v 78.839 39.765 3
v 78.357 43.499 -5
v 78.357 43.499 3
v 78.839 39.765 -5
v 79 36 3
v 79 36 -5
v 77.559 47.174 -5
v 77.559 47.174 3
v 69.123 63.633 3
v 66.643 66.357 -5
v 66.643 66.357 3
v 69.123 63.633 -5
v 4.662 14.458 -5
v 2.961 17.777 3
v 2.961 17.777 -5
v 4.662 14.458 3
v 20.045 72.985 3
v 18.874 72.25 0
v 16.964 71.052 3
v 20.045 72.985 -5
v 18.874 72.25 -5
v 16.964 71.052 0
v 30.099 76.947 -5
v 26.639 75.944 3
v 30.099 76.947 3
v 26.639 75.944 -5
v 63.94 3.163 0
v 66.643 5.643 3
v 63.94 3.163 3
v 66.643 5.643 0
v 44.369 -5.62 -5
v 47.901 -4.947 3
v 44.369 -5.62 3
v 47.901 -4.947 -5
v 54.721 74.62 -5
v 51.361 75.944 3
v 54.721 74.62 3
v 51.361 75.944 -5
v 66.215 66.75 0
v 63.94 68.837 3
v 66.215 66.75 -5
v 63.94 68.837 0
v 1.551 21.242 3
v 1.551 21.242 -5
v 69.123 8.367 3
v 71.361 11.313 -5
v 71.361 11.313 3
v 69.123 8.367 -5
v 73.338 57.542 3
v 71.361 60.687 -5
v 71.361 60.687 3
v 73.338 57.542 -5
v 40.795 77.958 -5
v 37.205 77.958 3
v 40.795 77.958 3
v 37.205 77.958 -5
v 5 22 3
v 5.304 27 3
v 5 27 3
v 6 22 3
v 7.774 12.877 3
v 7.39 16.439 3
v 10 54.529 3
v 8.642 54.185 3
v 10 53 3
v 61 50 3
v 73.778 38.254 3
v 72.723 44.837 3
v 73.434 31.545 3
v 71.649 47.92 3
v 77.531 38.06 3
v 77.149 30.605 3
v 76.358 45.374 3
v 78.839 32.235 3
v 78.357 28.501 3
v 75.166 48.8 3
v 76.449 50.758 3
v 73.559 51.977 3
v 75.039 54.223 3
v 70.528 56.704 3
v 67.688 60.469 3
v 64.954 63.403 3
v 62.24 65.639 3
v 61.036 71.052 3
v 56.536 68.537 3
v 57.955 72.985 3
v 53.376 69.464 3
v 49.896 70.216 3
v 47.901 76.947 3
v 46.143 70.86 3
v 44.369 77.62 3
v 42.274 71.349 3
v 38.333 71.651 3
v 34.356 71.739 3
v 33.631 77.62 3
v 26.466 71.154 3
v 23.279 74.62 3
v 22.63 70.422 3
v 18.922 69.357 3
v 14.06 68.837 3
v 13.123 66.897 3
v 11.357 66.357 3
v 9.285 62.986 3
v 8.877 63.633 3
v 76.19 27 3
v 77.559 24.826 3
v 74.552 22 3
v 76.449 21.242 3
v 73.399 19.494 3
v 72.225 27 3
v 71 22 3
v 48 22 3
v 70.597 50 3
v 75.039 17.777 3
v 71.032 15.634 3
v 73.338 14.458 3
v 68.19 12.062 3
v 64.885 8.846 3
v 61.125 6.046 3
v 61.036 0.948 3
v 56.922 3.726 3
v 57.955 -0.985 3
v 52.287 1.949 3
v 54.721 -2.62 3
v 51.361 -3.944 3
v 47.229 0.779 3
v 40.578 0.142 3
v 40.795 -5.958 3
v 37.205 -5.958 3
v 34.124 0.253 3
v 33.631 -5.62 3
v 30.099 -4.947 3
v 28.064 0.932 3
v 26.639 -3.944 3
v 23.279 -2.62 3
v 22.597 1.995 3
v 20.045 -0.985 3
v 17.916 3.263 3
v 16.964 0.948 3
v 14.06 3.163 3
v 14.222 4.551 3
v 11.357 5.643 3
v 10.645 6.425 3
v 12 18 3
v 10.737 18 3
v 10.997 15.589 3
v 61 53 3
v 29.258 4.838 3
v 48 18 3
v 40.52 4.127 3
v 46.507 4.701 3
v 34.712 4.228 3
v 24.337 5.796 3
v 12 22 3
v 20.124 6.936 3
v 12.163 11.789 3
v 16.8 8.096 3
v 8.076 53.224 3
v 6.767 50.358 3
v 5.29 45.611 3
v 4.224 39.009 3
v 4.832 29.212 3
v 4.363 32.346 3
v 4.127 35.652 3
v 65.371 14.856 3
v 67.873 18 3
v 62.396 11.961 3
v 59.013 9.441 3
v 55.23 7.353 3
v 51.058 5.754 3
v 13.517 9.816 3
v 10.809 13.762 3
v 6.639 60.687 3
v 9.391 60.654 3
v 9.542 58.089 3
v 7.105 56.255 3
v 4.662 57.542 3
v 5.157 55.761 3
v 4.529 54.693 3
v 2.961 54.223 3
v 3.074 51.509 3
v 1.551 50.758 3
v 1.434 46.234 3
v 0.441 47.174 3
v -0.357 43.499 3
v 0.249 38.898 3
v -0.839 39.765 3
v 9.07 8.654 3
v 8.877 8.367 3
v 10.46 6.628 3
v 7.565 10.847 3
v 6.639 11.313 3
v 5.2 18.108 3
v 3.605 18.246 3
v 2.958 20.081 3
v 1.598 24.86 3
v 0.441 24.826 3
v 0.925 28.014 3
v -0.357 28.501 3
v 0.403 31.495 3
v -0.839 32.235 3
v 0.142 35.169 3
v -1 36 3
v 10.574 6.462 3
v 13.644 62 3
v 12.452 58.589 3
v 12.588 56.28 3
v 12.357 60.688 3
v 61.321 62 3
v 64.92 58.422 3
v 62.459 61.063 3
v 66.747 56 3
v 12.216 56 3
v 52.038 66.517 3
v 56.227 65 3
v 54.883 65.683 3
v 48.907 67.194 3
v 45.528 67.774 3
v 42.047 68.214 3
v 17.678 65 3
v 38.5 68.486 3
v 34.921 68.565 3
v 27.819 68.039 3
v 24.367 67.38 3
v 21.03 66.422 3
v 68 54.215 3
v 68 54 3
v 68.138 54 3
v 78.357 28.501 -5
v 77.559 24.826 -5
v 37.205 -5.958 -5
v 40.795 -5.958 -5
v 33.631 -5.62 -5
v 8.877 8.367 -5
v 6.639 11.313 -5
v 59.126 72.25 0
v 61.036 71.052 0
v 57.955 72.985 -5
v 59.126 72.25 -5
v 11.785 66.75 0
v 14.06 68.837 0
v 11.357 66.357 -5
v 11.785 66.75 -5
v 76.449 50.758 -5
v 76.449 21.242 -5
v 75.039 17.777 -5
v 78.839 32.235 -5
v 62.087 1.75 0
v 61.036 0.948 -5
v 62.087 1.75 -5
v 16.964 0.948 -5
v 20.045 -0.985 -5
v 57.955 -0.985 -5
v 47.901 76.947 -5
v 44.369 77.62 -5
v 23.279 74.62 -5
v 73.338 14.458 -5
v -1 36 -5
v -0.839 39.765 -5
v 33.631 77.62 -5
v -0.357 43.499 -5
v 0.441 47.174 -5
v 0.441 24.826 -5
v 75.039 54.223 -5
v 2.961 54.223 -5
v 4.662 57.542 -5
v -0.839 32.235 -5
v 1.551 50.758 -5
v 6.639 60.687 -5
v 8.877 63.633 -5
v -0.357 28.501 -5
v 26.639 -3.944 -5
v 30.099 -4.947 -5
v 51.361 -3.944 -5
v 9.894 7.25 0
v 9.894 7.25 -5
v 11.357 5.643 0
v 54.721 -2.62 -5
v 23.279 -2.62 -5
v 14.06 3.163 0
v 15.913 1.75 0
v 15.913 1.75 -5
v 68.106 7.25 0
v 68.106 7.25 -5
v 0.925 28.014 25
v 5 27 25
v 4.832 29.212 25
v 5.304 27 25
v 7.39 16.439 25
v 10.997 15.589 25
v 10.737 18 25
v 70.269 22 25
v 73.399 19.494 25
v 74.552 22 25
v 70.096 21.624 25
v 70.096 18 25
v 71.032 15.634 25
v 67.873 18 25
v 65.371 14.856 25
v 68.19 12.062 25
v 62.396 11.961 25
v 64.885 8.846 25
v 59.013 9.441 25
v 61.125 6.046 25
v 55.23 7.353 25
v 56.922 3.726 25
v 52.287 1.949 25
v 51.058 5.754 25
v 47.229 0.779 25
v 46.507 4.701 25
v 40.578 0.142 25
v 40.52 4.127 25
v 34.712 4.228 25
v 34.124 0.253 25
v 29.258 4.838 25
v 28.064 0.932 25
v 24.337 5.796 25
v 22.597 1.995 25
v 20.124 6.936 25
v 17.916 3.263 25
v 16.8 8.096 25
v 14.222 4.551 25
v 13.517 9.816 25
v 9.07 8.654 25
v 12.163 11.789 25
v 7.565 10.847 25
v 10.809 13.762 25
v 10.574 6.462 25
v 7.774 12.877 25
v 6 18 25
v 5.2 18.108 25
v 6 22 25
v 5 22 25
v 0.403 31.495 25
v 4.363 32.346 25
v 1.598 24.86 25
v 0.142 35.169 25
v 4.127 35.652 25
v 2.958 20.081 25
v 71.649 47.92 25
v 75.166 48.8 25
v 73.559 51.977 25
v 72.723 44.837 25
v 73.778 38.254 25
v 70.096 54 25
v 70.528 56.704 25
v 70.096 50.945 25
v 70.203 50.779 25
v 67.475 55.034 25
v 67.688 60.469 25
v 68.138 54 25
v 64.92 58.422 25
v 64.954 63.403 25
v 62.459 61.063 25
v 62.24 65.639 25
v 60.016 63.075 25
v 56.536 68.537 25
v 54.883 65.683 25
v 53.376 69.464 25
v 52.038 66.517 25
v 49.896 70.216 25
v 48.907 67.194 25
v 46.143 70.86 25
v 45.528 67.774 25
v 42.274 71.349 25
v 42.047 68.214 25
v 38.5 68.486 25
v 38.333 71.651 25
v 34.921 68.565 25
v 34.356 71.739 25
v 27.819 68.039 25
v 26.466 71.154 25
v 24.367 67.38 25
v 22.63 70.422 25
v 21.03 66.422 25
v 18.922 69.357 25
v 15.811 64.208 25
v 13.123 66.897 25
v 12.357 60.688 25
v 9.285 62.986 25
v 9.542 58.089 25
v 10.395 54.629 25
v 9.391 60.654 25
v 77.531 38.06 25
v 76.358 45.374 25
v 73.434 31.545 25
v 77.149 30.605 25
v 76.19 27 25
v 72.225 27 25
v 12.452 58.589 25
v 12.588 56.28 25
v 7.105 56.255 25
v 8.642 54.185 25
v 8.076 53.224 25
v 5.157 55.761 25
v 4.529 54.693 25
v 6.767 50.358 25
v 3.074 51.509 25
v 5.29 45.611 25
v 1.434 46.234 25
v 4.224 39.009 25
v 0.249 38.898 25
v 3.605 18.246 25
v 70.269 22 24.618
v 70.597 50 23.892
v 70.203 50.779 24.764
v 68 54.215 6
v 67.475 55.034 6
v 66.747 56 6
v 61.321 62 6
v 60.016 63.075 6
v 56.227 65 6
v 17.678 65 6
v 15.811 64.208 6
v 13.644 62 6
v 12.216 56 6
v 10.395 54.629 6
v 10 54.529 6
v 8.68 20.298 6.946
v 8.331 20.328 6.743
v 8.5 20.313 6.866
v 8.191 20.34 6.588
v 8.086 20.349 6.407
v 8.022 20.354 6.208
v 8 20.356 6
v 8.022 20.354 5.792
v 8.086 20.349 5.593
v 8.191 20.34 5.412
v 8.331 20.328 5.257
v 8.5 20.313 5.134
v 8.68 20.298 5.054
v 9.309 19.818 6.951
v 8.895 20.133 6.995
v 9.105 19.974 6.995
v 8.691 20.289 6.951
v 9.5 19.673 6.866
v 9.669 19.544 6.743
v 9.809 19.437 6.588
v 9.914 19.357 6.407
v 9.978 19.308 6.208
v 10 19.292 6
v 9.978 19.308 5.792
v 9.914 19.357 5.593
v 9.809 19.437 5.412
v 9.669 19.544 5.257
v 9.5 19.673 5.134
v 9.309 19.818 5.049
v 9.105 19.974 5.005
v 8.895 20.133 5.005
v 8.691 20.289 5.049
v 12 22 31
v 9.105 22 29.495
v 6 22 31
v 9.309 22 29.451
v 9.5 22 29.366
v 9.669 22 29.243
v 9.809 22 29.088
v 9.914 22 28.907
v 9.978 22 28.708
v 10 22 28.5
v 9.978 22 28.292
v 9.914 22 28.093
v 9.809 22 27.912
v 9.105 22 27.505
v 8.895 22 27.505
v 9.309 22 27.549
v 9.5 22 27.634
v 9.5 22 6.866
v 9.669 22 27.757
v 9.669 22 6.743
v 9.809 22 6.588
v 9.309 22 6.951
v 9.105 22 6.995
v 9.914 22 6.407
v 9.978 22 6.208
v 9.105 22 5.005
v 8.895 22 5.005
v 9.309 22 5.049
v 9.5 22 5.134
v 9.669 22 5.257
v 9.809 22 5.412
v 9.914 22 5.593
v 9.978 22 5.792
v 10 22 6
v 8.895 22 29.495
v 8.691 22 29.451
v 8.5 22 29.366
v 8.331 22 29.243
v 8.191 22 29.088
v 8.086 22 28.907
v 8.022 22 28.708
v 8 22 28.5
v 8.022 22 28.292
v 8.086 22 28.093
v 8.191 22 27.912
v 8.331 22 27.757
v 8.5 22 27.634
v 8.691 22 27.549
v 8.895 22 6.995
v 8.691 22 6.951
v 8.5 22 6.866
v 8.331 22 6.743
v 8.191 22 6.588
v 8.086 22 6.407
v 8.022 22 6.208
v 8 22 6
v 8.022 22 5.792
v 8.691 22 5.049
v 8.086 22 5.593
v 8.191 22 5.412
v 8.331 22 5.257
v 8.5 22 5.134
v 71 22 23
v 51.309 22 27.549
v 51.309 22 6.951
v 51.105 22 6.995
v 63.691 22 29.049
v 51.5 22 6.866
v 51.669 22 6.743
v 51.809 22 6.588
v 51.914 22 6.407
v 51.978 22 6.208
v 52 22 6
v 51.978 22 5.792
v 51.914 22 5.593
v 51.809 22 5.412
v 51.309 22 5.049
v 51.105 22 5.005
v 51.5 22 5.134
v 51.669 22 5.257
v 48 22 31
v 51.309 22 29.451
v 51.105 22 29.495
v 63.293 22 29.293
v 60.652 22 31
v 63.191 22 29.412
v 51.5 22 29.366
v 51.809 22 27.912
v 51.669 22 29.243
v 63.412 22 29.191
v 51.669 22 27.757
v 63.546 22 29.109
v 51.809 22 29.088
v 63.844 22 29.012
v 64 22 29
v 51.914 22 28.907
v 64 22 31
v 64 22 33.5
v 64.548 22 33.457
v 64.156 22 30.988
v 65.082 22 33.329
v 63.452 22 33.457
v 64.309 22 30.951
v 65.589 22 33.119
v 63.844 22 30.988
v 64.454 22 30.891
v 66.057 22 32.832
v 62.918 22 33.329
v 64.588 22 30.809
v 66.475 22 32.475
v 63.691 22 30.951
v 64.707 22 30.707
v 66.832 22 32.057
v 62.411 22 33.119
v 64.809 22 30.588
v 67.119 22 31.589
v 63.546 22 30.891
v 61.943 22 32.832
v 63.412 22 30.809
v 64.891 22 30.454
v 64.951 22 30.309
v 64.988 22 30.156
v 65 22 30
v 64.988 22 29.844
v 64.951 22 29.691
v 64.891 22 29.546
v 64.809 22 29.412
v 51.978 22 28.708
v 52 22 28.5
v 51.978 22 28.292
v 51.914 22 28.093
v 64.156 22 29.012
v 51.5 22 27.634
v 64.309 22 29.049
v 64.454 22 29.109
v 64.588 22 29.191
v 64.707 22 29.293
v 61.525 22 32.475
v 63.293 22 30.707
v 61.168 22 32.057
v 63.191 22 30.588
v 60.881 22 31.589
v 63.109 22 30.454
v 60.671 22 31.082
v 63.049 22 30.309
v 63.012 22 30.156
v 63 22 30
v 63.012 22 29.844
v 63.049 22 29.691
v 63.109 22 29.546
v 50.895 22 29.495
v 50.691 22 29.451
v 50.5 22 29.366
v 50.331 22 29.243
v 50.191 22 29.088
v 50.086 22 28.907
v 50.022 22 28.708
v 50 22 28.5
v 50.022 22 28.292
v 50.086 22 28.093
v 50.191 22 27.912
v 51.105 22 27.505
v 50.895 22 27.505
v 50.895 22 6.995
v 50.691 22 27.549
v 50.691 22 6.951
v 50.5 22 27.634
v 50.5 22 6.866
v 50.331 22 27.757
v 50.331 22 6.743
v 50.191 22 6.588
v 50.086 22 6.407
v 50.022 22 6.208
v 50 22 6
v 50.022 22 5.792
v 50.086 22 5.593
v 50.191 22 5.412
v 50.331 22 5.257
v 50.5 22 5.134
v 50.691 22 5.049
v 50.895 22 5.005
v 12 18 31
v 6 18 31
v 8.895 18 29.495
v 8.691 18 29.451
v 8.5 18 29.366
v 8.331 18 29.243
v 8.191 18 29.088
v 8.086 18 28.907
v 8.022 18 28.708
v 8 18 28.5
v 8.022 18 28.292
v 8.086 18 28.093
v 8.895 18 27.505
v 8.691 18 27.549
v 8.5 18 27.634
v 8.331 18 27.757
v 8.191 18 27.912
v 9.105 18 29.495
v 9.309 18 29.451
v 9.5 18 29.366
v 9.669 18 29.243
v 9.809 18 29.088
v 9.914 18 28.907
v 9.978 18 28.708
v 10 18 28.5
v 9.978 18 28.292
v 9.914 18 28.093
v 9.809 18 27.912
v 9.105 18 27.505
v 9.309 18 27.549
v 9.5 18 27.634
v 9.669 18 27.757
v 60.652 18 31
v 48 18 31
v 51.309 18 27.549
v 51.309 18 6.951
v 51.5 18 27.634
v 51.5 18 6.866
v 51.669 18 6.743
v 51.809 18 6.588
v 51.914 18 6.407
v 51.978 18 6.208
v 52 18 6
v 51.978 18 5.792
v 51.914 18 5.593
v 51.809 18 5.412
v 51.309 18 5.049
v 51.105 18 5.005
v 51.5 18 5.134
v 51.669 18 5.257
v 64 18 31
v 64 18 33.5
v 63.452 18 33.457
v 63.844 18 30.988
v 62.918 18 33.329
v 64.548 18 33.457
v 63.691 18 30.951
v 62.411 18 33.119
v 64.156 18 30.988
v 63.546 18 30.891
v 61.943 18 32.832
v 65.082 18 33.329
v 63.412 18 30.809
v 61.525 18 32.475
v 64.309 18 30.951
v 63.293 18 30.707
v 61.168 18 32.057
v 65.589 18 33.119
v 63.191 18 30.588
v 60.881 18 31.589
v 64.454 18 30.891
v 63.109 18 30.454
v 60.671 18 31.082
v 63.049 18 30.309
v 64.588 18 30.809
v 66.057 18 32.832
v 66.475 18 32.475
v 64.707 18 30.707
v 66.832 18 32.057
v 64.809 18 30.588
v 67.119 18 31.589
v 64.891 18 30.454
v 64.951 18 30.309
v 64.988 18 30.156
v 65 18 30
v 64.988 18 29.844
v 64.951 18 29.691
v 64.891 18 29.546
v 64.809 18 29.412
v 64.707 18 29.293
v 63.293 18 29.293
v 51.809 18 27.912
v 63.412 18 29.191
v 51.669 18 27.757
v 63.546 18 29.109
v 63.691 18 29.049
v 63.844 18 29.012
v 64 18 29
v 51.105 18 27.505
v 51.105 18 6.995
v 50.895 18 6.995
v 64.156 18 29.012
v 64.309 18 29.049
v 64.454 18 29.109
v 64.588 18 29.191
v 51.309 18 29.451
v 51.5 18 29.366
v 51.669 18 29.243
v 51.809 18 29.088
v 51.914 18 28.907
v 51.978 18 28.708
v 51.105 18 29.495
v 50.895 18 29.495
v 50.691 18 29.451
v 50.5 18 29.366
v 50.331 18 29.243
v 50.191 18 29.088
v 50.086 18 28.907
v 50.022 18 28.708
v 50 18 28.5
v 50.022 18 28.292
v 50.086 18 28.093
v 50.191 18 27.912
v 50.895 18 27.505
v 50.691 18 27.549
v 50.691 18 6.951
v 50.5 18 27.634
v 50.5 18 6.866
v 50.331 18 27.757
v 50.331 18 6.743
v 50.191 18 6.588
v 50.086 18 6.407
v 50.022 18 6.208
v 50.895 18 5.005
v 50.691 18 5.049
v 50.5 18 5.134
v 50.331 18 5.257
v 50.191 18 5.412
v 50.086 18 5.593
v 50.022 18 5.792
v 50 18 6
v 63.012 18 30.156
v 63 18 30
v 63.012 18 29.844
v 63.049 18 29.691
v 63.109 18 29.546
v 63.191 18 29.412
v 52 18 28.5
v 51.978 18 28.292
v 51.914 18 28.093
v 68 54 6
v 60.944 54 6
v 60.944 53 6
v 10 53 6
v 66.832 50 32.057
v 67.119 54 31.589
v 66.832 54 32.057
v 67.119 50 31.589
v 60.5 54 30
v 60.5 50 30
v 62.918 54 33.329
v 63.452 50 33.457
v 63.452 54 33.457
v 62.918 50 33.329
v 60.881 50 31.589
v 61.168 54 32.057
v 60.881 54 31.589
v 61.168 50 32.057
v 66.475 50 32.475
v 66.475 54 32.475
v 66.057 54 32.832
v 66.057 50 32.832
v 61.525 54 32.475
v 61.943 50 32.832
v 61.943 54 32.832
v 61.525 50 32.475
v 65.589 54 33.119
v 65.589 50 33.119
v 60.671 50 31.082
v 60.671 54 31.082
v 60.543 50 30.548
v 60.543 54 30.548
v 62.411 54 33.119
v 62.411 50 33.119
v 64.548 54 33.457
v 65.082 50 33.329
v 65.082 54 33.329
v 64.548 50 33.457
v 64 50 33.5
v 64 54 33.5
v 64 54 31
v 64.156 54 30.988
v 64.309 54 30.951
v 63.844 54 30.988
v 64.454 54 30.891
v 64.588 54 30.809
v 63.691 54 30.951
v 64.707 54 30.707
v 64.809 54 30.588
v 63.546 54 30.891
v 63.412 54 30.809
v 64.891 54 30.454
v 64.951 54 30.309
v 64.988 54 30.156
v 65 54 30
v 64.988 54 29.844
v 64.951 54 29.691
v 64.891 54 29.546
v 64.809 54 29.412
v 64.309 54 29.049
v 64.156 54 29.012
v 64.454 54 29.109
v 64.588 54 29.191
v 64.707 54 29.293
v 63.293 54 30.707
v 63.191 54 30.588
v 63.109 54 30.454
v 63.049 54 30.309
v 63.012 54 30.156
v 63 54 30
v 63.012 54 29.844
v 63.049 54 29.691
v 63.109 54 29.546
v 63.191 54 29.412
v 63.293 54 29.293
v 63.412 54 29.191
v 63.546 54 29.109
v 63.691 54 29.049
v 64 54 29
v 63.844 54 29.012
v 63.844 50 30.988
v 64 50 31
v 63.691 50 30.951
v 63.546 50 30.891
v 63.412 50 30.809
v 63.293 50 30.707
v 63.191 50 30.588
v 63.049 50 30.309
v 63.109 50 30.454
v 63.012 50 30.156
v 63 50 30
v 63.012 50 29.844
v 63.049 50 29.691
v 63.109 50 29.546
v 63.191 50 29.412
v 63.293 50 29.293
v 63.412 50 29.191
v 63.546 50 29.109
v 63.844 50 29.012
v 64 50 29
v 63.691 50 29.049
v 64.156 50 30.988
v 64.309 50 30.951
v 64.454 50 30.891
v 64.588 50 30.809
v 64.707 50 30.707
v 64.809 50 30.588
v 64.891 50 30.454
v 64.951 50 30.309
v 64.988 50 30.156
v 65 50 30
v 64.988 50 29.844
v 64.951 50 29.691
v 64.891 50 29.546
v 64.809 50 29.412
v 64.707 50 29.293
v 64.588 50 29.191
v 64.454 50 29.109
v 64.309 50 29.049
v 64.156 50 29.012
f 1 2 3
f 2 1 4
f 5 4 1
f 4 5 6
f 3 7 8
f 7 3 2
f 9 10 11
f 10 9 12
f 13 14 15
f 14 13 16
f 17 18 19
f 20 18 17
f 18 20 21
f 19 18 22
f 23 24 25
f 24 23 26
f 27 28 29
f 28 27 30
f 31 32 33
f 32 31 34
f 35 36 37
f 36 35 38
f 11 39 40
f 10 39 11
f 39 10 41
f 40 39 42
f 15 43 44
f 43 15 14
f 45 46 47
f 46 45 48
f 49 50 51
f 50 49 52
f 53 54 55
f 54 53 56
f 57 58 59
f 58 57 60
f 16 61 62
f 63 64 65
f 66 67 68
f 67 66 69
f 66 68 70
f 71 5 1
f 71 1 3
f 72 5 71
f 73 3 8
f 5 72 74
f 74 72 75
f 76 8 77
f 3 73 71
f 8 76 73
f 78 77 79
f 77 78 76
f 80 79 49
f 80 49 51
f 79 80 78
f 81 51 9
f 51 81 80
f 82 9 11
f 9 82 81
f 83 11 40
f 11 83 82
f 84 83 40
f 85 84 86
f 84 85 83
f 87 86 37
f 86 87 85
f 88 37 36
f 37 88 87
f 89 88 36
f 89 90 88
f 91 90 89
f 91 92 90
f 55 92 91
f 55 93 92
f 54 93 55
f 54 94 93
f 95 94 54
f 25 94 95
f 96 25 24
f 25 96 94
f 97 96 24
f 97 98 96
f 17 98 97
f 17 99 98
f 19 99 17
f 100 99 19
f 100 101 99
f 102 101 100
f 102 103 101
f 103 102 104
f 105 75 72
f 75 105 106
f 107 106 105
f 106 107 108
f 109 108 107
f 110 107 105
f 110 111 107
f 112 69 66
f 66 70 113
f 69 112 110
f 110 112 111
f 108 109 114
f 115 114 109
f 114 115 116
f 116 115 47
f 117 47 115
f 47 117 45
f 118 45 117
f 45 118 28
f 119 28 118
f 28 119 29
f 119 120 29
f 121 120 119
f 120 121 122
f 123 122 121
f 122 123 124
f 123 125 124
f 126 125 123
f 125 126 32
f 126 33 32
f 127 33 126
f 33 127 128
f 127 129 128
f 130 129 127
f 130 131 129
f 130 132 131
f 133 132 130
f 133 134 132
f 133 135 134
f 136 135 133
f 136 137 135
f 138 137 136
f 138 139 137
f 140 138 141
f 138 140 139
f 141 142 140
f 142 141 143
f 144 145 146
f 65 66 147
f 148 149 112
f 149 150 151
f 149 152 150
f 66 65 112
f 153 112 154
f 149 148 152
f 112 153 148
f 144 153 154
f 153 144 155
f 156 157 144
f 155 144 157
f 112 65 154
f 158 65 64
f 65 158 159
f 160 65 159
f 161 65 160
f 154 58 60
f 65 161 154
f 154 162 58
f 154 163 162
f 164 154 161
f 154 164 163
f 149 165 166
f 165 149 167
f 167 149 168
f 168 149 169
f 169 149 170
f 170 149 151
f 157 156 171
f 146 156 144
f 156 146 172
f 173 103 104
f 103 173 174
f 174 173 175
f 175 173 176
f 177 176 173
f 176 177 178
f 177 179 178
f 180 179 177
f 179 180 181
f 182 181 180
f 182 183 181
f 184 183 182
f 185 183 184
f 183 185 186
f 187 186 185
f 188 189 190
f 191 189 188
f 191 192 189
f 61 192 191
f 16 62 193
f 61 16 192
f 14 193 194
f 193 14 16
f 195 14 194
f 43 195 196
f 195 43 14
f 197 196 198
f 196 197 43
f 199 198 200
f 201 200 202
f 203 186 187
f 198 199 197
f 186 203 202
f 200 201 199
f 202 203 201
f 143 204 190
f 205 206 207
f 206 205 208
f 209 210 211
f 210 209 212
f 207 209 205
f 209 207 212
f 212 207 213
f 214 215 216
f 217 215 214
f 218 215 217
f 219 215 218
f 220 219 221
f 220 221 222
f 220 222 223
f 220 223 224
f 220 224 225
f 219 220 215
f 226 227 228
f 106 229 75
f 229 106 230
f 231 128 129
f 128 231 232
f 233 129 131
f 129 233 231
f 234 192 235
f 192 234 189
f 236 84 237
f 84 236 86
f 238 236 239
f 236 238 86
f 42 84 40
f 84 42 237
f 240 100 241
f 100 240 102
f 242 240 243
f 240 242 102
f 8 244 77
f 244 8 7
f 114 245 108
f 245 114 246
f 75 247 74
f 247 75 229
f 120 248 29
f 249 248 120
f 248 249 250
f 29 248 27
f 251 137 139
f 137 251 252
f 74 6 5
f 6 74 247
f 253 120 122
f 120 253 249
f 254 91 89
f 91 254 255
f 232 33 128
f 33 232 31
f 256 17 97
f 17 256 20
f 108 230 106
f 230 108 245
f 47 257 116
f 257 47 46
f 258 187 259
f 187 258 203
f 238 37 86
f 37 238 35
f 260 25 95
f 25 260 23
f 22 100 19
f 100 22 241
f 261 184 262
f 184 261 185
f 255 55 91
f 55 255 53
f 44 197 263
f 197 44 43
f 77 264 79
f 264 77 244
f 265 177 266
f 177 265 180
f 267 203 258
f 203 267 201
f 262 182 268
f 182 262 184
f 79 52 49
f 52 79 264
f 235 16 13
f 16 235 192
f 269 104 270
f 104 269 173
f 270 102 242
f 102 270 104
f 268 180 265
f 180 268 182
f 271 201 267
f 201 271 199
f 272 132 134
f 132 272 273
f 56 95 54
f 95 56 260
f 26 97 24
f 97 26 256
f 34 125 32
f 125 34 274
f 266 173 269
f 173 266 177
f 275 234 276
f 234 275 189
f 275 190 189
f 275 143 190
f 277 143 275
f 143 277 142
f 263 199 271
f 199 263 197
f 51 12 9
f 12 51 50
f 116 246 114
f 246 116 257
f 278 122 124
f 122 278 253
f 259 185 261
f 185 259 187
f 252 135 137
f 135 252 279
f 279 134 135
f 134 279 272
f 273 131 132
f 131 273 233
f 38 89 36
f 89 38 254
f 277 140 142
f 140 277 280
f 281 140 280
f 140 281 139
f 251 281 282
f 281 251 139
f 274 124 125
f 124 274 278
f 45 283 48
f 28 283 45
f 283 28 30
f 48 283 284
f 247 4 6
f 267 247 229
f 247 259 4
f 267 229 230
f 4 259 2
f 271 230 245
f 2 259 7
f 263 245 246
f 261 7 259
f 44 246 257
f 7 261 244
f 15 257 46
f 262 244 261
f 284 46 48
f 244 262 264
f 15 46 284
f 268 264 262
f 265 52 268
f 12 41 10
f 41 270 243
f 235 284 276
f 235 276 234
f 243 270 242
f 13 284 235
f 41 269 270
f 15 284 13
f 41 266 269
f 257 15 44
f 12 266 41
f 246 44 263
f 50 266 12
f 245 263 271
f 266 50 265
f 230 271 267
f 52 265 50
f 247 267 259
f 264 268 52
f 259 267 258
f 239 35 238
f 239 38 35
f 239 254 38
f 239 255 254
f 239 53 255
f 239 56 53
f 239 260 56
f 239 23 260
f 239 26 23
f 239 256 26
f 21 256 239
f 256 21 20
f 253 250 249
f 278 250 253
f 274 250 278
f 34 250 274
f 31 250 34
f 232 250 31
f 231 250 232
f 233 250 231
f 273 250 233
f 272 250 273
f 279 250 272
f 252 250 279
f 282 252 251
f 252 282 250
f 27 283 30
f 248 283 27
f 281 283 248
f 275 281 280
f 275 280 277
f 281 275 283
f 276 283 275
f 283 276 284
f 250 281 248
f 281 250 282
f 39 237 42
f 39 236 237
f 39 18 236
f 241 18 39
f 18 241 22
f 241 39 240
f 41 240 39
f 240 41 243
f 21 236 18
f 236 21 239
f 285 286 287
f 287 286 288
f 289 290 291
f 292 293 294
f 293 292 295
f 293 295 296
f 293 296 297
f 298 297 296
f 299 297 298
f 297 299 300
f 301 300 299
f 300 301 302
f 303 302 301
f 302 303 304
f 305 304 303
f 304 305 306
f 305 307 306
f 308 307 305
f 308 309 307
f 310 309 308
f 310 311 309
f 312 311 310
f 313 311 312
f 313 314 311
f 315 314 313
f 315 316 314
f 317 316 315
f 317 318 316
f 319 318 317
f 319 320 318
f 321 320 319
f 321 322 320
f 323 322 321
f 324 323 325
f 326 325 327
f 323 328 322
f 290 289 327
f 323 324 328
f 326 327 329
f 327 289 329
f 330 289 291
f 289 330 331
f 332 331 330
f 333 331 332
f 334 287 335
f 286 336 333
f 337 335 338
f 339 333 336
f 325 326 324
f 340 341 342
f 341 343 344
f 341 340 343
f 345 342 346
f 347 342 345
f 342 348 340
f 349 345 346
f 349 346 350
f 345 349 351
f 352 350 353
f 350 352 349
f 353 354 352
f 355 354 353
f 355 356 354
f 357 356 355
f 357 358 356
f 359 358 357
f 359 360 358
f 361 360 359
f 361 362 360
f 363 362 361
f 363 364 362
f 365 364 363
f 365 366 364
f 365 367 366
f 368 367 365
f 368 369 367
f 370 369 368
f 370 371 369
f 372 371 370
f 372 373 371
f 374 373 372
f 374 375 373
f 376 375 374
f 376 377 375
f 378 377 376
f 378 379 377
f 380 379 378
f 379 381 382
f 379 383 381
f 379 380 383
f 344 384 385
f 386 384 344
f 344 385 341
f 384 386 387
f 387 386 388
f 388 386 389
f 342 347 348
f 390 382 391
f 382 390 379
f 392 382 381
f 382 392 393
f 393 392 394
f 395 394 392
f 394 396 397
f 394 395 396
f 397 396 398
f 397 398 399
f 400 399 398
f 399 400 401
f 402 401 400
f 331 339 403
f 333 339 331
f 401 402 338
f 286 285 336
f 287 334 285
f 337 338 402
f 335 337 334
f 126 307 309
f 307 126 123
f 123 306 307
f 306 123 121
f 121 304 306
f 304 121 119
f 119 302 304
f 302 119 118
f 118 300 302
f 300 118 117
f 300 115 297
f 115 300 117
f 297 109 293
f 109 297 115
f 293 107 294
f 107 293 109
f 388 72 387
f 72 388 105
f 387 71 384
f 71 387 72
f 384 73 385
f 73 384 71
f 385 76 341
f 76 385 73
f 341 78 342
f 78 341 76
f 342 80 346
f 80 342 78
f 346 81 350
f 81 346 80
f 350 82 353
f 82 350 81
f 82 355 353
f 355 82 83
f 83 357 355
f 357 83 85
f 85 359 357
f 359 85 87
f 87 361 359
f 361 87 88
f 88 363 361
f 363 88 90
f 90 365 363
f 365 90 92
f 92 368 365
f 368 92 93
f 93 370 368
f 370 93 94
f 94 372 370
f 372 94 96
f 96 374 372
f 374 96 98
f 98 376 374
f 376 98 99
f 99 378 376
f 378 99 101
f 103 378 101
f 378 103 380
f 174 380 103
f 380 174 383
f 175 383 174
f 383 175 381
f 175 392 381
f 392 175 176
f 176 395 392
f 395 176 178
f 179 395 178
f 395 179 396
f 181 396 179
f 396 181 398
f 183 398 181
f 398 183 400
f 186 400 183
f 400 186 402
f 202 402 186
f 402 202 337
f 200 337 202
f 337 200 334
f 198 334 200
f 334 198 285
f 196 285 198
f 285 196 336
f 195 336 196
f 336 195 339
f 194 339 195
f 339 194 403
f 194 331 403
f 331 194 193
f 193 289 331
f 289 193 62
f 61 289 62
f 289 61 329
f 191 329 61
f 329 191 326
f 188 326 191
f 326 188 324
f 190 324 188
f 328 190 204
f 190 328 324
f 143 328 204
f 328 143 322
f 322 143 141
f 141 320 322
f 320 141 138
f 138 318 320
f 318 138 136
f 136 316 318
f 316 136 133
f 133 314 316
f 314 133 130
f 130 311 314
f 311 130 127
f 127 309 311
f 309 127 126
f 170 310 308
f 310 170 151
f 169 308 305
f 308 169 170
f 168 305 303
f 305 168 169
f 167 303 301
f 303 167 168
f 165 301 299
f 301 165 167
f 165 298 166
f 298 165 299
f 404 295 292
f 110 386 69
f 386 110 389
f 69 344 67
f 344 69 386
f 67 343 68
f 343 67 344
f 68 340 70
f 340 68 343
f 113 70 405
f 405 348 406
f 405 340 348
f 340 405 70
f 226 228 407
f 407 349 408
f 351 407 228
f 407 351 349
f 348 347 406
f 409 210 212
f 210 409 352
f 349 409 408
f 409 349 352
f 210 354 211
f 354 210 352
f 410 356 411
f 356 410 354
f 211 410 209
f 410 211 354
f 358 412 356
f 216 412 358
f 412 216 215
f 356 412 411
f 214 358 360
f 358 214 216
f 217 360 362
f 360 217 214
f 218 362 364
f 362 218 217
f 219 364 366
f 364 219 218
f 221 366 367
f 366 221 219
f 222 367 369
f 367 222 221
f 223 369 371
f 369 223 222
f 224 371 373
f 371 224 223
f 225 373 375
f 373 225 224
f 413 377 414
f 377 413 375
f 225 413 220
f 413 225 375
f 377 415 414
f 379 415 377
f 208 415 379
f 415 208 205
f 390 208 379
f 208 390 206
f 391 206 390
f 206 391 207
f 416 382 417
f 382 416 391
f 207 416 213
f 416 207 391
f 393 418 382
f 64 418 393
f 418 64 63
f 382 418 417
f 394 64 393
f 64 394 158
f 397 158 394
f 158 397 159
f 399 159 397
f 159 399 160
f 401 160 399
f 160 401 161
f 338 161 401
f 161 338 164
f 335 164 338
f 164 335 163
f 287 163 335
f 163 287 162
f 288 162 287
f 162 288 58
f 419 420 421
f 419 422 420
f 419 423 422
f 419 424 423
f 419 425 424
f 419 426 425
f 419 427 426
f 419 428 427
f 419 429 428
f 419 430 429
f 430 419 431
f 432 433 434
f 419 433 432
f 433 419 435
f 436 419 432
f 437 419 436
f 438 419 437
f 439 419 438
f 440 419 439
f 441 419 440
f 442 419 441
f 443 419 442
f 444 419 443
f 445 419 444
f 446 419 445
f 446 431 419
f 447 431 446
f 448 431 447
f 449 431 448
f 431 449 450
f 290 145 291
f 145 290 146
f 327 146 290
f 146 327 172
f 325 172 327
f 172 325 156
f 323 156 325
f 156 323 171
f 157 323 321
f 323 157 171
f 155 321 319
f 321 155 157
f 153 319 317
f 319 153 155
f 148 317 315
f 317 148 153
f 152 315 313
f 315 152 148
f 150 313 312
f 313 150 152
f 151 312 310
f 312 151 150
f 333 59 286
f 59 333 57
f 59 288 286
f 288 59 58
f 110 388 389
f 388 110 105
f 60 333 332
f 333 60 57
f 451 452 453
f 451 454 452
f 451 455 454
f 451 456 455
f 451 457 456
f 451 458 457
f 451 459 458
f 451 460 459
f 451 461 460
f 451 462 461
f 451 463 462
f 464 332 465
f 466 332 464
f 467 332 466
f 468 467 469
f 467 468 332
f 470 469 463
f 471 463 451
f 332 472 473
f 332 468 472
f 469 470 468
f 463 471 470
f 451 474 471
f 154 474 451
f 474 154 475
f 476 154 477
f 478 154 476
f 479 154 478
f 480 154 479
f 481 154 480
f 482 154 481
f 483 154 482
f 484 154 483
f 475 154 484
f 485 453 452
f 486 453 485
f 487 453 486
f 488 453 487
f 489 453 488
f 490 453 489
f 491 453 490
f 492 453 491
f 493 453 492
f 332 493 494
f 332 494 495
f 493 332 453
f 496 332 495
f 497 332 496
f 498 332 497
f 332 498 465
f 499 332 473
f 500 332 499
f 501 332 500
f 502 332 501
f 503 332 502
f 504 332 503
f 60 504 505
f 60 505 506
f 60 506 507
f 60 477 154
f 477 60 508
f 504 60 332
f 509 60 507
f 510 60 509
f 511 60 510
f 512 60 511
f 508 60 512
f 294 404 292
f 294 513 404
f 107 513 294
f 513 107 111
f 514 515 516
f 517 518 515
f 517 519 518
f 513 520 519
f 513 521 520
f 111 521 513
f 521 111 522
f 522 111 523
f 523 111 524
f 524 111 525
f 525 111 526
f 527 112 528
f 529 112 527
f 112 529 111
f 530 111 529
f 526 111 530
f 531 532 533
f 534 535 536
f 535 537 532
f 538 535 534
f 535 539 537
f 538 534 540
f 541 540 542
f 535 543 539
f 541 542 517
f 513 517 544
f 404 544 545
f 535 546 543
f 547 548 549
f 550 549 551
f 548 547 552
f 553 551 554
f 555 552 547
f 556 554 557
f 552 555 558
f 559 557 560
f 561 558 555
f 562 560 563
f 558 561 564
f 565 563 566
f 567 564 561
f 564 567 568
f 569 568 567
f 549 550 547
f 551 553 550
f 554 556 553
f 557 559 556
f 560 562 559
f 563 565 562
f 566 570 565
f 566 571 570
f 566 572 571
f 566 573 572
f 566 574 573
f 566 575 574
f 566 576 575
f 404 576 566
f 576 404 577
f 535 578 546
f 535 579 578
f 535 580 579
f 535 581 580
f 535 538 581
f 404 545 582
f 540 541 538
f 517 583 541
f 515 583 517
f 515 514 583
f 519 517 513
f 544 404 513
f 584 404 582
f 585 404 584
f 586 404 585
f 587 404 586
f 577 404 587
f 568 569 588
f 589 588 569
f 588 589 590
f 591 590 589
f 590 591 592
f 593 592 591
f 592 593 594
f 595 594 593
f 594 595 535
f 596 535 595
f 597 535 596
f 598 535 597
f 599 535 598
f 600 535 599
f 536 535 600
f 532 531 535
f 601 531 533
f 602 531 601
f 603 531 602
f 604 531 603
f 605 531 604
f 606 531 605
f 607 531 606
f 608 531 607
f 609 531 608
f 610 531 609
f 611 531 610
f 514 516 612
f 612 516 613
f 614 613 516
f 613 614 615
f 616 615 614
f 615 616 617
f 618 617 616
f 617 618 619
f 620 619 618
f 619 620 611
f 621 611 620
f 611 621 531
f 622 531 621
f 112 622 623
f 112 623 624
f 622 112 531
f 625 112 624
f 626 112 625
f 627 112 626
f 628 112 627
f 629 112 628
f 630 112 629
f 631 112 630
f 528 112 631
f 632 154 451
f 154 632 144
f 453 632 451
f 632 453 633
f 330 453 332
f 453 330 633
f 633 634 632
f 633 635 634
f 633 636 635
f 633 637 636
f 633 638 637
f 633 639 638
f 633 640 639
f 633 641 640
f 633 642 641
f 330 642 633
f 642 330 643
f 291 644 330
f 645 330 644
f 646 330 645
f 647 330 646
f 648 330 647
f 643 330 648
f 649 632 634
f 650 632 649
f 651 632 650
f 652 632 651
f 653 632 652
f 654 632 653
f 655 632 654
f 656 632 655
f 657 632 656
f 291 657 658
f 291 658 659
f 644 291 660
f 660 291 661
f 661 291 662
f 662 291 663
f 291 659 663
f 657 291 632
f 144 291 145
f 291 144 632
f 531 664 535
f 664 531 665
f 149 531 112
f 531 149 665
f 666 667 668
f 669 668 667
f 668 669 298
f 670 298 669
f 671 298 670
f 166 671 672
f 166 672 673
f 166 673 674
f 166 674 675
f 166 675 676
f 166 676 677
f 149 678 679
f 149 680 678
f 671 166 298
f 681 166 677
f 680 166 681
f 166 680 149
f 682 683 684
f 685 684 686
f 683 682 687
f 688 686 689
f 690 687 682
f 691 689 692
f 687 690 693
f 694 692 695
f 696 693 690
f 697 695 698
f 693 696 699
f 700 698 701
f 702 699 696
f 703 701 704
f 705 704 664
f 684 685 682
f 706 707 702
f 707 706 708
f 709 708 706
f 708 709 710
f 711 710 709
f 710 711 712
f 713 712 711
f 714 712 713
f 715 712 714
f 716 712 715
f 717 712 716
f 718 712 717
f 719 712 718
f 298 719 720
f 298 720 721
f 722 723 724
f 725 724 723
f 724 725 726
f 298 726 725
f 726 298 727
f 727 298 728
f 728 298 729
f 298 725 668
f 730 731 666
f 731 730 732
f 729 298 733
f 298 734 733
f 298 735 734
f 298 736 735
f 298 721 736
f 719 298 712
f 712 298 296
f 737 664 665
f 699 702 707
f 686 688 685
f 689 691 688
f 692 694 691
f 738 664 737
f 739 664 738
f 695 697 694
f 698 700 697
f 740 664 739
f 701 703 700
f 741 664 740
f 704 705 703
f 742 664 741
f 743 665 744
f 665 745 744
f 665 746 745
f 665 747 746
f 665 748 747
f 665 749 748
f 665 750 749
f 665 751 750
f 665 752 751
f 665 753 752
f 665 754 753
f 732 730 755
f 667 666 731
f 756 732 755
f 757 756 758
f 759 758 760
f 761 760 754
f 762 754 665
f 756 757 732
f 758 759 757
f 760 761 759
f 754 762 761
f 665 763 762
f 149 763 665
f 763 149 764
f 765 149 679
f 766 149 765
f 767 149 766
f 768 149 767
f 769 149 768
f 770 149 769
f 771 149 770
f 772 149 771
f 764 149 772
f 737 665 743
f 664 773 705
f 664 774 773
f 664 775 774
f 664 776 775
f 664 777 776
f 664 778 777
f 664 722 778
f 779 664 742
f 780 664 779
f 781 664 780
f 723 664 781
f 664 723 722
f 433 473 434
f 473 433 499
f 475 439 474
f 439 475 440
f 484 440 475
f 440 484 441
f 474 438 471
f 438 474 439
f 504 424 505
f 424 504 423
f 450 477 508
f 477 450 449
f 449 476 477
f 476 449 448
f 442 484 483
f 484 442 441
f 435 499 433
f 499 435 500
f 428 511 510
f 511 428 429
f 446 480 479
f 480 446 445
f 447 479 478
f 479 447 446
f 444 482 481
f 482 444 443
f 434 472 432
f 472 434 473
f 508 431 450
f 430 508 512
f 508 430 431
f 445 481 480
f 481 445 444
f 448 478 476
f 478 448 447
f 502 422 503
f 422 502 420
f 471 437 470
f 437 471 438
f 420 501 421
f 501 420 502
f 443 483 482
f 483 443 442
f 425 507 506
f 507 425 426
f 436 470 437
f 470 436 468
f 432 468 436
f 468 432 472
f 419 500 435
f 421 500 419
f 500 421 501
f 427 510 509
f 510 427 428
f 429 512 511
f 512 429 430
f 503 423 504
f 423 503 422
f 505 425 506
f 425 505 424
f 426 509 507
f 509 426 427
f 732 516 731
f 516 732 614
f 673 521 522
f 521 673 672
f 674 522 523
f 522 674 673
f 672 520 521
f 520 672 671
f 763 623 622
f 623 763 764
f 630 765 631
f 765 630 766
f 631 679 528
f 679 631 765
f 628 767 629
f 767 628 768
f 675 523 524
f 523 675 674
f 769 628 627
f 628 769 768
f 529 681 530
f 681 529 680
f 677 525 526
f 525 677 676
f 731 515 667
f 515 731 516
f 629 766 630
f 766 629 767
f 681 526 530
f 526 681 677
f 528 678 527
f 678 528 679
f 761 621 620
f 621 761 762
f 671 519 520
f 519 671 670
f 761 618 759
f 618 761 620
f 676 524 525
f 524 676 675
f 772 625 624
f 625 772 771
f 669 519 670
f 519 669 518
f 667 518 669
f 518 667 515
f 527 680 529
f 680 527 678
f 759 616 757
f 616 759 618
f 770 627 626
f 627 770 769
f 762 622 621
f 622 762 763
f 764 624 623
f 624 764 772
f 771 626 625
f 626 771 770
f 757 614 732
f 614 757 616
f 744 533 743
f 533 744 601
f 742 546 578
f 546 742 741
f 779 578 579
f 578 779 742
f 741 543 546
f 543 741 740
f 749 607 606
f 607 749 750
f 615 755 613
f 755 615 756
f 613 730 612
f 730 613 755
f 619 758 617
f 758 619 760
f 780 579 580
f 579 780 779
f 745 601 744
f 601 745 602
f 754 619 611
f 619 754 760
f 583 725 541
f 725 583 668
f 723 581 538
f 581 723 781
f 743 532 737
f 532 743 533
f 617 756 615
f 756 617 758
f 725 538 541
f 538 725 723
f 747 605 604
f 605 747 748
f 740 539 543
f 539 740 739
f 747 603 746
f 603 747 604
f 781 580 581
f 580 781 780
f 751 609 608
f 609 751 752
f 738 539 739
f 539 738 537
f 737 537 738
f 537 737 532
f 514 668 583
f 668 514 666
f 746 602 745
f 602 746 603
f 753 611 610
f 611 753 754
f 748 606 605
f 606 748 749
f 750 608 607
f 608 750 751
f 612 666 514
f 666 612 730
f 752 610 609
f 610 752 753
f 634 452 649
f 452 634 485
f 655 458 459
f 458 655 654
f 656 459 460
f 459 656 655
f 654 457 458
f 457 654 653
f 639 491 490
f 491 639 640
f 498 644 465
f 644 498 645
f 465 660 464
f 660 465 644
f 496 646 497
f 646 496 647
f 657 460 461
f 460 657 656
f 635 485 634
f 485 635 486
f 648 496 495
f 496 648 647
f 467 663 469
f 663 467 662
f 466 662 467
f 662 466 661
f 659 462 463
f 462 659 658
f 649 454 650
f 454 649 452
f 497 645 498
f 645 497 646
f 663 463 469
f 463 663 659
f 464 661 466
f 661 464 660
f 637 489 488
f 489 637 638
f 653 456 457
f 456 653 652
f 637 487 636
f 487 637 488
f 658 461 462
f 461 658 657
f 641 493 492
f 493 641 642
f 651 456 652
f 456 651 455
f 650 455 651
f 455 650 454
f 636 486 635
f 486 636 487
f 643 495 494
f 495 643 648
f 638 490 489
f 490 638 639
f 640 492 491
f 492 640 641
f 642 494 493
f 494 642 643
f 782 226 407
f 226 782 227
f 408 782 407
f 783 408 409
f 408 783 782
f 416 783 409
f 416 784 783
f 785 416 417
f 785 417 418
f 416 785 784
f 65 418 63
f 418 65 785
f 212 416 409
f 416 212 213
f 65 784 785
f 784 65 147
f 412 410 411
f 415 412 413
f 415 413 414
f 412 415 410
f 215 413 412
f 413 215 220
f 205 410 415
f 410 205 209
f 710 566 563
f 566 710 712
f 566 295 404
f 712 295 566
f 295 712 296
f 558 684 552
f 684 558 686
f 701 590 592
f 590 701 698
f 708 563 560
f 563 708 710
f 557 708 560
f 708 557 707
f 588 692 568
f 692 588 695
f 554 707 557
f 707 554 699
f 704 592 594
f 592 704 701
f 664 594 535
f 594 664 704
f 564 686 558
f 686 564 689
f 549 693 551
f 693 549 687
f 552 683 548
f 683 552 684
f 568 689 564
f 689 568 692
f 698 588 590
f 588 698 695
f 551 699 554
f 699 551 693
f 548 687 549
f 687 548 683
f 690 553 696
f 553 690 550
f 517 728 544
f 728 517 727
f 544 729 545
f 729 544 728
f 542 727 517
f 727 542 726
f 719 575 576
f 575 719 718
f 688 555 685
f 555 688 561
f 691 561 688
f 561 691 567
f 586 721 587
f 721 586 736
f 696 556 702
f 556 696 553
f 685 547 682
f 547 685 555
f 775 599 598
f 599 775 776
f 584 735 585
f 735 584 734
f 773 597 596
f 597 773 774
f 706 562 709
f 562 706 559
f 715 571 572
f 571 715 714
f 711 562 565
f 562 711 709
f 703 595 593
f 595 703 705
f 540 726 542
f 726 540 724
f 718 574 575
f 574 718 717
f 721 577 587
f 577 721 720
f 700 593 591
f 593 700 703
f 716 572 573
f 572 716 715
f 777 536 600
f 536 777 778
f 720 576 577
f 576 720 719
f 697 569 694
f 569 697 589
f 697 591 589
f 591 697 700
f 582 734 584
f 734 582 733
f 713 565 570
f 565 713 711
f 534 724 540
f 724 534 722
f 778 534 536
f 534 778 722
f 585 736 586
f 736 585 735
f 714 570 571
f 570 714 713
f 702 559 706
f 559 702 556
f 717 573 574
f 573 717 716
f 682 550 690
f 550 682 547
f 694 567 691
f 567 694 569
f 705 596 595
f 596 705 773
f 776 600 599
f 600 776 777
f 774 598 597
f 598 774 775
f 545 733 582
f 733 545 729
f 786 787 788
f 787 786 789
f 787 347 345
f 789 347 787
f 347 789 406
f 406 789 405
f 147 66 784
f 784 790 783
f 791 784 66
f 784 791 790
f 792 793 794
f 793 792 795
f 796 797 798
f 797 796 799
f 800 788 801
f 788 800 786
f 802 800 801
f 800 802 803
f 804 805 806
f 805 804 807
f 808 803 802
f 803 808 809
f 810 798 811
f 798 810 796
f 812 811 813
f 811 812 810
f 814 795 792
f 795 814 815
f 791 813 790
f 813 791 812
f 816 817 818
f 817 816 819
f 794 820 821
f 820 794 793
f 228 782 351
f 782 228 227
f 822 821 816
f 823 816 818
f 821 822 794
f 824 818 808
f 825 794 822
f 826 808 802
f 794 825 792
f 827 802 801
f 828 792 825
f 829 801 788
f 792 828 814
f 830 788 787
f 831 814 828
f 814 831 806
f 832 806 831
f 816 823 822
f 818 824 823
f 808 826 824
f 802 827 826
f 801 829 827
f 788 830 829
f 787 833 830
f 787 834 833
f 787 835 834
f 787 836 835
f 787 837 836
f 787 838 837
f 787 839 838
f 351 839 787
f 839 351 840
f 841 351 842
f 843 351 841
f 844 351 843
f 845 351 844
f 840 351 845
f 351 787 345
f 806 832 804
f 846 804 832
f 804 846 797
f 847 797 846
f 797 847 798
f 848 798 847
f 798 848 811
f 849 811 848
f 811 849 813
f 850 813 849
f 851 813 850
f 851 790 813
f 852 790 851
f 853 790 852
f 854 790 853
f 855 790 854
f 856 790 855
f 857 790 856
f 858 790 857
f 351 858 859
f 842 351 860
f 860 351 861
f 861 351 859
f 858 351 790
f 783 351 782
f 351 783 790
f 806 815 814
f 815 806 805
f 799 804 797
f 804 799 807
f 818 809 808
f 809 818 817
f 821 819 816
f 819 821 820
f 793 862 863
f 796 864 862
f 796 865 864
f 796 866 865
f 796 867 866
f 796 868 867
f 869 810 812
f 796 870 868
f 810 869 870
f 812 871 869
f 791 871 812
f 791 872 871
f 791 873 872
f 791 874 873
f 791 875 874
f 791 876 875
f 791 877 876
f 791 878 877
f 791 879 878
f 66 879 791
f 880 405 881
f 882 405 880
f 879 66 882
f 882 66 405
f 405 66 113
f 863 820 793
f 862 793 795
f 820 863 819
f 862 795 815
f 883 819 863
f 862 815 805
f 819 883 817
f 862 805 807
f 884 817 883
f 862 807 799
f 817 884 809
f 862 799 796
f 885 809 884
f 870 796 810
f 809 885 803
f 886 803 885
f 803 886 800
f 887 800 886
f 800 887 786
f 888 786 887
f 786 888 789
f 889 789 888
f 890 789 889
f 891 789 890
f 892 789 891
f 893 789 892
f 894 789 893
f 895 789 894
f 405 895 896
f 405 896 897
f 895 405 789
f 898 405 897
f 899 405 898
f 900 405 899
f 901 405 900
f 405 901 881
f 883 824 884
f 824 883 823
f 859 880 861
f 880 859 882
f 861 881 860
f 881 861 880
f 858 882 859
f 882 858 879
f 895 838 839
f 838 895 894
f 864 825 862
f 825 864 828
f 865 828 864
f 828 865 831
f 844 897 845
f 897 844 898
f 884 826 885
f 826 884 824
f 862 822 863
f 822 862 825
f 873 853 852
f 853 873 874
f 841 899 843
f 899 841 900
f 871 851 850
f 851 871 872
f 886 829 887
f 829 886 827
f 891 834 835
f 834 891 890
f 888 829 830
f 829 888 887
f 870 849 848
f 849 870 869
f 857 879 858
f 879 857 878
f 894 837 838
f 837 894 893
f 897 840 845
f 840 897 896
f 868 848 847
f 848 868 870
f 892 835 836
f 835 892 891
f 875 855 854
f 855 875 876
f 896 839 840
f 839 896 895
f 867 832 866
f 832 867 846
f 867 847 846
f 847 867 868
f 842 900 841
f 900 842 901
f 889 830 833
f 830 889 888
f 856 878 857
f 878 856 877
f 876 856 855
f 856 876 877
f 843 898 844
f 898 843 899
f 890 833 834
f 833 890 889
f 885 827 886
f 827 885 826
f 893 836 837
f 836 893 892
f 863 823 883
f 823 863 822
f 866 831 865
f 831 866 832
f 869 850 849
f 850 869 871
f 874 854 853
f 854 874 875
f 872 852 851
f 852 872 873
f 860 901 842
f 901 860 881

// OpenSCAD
// file: EdisonMockups.scad
module EdisonArduino()
{
    //Mock Edison Arduino Breakout
    difference() {
    cube([122.3,72,3]);
	EdisonArduinoMountingHoles(1.5);
}

module EdisonArduinoMountingHoles(radius)
{
    //Mounting Holes
    translate([6.3,6.3,-3])
        cylinder(h=10,r=radius,$fn=30);
    translate([6.3,59.1,-3])
        cylinder(h=10,r=radius,$fn=30);
    translate([48,27.2,-3])
        cylinder(h=10,r=radius,$fn=30);    
    translate([48,51.5,-3])
        cylinder(h=10,r=radius,$fn=30);    
    translate([106.6,11.9,-3])
        cylinder(h=10,r=radius,$fn=30);  
    translate([106.4,60.2,-3])
        cylinder(h=10,r=radius,$fn=30); 
    }
}


module EdisonMini() {
	difference() {
    cube([60,29,3]);
	EdisonMiniMountingHoles(1.5);
	}
}

module EdisonMiniMountingHoles(radius) {
//Mounting Holes
    translate([3,3,-3])
        cylinder(h=10,r=radius,$fn=30);
    translate([45,3,-3])
        cylinder(h=10,r=radius,$fn=30);
    translate([45,25.5,-3])
        cylinder(h=10,r=radius,$fn=30);    
    translate([3,25.5,-3])
        cylinder(h=10,r=radius,$fn=30);    
}

//EdisonArduino();
//EdisonMini();
// main file
include <EdisonMockups.scad>

module FurbyBase() {

linear_extrude(height = 8, center = true)
	import("FurbyBaseOutline.dxf");
}

module FurbyWall() {
difference() {
linear_extrude(height = 22, center = true)
	import("FurbyBaseOutline.dxf");

translate([4,4,0])
	scale([0.9,0.9,1.2])
		linear_extrude(height = 30, center = true)
			import("FurbyBaseOutline.dxf");

translate([5,22,-13])
	cube([74,5,28]);
	}
}



module EdisonMounts() {
	translate([-3,2,0])
	difference() {
	union() {
		translate([9,16,3])
			cube([6,4,28]);
		translate([51,16,3])
			cube([14,4,28]);
	}
	translate([9,22,3])
		rotate([90,0,0])
			EdisonMiniMountingHoles(1);
	}
	
}	

module ModuleMounts() {
	translate([10,53,2])
		cube([58,3,4]);
	translate([13,62,2])
		cube([49,3,4]);	
}

module FurbyPivot() {
	//translate([60,15,25])
	//cube([7,38,10]);	
	
	translate([64,20,30])
	difference() {
		hull() {
		translate([-3,-2,-27])
			cube([10,4,20]);
		rotate([0,90,90])
			cylinder(d=7,h=4,center=true,$fn=40);
		}
		rotate([0,90,90])
			cylinder(d=2,h=9,center=true,$fn=40);	
		}	
	translate([64,38+14,30])
	difference() {
		hull() {
		translate([-3,-2,-27])
			cube([10,4,20]);
		rotate([0,90,90])
			cylinder(d=7,h=4,center=true,$fn=40);
		}
		rotate([0,90,90])
			cylinder(d=2,h=9,center=true,$fn=40);	
	}
}

module Platform() {
difference() {	
	translate([39,36,-8])
	scale([1,1.05,1])
		cylinder(d=80,h=8,center=true,$fn=70);

    //Chassis cutouts
    translate([70,0+2-0.25,-17])
        rotate([0,0,90])
            cube([5+0.5,81.5,10]);
    translate([70,65+2-0.25,-17])
        rotate([0,0,90])
            cube([5+0.5,81.5+0.5,10]);
	}
}

module Battery() {
	color("Blue")
		cylinder(d=17,h=64,center=true,$fn=50);
}

module Powerboard() {
	color("DarkSlateGray")
		cube([23,12,3],center=true,$fn=50);
}

module Audioboard() {
	color("IndianRed")
		cube([25,15,3],center=true,$fn=50);
}

module Motorboard() {
	color("DarkRed")
		cube([20,20,3],center=true,$fn=50);
}

module Components() {
translate([6,25,3])
	rotate([90,0,0])
		EdisonMini();

translate([38,38,12])
	rotate([0,90,0])
		Battery();

translate([38,6,5])
		Powerboard();

translate([50,60,11])
	rotate([90,0,0])
		Audioboard();

translate([25,60,11])
	rotate([90,0,0])
		Motorboard();
}

//Components();

union() {
translate([0,0,7])
Platform();
//translate([0,0,-0.5])
//FurbyBase();
translate([0,0,14])
	FurbyWall();
EdisonMounts();
ModuleMounts();
FurbyPivot();
}
	
